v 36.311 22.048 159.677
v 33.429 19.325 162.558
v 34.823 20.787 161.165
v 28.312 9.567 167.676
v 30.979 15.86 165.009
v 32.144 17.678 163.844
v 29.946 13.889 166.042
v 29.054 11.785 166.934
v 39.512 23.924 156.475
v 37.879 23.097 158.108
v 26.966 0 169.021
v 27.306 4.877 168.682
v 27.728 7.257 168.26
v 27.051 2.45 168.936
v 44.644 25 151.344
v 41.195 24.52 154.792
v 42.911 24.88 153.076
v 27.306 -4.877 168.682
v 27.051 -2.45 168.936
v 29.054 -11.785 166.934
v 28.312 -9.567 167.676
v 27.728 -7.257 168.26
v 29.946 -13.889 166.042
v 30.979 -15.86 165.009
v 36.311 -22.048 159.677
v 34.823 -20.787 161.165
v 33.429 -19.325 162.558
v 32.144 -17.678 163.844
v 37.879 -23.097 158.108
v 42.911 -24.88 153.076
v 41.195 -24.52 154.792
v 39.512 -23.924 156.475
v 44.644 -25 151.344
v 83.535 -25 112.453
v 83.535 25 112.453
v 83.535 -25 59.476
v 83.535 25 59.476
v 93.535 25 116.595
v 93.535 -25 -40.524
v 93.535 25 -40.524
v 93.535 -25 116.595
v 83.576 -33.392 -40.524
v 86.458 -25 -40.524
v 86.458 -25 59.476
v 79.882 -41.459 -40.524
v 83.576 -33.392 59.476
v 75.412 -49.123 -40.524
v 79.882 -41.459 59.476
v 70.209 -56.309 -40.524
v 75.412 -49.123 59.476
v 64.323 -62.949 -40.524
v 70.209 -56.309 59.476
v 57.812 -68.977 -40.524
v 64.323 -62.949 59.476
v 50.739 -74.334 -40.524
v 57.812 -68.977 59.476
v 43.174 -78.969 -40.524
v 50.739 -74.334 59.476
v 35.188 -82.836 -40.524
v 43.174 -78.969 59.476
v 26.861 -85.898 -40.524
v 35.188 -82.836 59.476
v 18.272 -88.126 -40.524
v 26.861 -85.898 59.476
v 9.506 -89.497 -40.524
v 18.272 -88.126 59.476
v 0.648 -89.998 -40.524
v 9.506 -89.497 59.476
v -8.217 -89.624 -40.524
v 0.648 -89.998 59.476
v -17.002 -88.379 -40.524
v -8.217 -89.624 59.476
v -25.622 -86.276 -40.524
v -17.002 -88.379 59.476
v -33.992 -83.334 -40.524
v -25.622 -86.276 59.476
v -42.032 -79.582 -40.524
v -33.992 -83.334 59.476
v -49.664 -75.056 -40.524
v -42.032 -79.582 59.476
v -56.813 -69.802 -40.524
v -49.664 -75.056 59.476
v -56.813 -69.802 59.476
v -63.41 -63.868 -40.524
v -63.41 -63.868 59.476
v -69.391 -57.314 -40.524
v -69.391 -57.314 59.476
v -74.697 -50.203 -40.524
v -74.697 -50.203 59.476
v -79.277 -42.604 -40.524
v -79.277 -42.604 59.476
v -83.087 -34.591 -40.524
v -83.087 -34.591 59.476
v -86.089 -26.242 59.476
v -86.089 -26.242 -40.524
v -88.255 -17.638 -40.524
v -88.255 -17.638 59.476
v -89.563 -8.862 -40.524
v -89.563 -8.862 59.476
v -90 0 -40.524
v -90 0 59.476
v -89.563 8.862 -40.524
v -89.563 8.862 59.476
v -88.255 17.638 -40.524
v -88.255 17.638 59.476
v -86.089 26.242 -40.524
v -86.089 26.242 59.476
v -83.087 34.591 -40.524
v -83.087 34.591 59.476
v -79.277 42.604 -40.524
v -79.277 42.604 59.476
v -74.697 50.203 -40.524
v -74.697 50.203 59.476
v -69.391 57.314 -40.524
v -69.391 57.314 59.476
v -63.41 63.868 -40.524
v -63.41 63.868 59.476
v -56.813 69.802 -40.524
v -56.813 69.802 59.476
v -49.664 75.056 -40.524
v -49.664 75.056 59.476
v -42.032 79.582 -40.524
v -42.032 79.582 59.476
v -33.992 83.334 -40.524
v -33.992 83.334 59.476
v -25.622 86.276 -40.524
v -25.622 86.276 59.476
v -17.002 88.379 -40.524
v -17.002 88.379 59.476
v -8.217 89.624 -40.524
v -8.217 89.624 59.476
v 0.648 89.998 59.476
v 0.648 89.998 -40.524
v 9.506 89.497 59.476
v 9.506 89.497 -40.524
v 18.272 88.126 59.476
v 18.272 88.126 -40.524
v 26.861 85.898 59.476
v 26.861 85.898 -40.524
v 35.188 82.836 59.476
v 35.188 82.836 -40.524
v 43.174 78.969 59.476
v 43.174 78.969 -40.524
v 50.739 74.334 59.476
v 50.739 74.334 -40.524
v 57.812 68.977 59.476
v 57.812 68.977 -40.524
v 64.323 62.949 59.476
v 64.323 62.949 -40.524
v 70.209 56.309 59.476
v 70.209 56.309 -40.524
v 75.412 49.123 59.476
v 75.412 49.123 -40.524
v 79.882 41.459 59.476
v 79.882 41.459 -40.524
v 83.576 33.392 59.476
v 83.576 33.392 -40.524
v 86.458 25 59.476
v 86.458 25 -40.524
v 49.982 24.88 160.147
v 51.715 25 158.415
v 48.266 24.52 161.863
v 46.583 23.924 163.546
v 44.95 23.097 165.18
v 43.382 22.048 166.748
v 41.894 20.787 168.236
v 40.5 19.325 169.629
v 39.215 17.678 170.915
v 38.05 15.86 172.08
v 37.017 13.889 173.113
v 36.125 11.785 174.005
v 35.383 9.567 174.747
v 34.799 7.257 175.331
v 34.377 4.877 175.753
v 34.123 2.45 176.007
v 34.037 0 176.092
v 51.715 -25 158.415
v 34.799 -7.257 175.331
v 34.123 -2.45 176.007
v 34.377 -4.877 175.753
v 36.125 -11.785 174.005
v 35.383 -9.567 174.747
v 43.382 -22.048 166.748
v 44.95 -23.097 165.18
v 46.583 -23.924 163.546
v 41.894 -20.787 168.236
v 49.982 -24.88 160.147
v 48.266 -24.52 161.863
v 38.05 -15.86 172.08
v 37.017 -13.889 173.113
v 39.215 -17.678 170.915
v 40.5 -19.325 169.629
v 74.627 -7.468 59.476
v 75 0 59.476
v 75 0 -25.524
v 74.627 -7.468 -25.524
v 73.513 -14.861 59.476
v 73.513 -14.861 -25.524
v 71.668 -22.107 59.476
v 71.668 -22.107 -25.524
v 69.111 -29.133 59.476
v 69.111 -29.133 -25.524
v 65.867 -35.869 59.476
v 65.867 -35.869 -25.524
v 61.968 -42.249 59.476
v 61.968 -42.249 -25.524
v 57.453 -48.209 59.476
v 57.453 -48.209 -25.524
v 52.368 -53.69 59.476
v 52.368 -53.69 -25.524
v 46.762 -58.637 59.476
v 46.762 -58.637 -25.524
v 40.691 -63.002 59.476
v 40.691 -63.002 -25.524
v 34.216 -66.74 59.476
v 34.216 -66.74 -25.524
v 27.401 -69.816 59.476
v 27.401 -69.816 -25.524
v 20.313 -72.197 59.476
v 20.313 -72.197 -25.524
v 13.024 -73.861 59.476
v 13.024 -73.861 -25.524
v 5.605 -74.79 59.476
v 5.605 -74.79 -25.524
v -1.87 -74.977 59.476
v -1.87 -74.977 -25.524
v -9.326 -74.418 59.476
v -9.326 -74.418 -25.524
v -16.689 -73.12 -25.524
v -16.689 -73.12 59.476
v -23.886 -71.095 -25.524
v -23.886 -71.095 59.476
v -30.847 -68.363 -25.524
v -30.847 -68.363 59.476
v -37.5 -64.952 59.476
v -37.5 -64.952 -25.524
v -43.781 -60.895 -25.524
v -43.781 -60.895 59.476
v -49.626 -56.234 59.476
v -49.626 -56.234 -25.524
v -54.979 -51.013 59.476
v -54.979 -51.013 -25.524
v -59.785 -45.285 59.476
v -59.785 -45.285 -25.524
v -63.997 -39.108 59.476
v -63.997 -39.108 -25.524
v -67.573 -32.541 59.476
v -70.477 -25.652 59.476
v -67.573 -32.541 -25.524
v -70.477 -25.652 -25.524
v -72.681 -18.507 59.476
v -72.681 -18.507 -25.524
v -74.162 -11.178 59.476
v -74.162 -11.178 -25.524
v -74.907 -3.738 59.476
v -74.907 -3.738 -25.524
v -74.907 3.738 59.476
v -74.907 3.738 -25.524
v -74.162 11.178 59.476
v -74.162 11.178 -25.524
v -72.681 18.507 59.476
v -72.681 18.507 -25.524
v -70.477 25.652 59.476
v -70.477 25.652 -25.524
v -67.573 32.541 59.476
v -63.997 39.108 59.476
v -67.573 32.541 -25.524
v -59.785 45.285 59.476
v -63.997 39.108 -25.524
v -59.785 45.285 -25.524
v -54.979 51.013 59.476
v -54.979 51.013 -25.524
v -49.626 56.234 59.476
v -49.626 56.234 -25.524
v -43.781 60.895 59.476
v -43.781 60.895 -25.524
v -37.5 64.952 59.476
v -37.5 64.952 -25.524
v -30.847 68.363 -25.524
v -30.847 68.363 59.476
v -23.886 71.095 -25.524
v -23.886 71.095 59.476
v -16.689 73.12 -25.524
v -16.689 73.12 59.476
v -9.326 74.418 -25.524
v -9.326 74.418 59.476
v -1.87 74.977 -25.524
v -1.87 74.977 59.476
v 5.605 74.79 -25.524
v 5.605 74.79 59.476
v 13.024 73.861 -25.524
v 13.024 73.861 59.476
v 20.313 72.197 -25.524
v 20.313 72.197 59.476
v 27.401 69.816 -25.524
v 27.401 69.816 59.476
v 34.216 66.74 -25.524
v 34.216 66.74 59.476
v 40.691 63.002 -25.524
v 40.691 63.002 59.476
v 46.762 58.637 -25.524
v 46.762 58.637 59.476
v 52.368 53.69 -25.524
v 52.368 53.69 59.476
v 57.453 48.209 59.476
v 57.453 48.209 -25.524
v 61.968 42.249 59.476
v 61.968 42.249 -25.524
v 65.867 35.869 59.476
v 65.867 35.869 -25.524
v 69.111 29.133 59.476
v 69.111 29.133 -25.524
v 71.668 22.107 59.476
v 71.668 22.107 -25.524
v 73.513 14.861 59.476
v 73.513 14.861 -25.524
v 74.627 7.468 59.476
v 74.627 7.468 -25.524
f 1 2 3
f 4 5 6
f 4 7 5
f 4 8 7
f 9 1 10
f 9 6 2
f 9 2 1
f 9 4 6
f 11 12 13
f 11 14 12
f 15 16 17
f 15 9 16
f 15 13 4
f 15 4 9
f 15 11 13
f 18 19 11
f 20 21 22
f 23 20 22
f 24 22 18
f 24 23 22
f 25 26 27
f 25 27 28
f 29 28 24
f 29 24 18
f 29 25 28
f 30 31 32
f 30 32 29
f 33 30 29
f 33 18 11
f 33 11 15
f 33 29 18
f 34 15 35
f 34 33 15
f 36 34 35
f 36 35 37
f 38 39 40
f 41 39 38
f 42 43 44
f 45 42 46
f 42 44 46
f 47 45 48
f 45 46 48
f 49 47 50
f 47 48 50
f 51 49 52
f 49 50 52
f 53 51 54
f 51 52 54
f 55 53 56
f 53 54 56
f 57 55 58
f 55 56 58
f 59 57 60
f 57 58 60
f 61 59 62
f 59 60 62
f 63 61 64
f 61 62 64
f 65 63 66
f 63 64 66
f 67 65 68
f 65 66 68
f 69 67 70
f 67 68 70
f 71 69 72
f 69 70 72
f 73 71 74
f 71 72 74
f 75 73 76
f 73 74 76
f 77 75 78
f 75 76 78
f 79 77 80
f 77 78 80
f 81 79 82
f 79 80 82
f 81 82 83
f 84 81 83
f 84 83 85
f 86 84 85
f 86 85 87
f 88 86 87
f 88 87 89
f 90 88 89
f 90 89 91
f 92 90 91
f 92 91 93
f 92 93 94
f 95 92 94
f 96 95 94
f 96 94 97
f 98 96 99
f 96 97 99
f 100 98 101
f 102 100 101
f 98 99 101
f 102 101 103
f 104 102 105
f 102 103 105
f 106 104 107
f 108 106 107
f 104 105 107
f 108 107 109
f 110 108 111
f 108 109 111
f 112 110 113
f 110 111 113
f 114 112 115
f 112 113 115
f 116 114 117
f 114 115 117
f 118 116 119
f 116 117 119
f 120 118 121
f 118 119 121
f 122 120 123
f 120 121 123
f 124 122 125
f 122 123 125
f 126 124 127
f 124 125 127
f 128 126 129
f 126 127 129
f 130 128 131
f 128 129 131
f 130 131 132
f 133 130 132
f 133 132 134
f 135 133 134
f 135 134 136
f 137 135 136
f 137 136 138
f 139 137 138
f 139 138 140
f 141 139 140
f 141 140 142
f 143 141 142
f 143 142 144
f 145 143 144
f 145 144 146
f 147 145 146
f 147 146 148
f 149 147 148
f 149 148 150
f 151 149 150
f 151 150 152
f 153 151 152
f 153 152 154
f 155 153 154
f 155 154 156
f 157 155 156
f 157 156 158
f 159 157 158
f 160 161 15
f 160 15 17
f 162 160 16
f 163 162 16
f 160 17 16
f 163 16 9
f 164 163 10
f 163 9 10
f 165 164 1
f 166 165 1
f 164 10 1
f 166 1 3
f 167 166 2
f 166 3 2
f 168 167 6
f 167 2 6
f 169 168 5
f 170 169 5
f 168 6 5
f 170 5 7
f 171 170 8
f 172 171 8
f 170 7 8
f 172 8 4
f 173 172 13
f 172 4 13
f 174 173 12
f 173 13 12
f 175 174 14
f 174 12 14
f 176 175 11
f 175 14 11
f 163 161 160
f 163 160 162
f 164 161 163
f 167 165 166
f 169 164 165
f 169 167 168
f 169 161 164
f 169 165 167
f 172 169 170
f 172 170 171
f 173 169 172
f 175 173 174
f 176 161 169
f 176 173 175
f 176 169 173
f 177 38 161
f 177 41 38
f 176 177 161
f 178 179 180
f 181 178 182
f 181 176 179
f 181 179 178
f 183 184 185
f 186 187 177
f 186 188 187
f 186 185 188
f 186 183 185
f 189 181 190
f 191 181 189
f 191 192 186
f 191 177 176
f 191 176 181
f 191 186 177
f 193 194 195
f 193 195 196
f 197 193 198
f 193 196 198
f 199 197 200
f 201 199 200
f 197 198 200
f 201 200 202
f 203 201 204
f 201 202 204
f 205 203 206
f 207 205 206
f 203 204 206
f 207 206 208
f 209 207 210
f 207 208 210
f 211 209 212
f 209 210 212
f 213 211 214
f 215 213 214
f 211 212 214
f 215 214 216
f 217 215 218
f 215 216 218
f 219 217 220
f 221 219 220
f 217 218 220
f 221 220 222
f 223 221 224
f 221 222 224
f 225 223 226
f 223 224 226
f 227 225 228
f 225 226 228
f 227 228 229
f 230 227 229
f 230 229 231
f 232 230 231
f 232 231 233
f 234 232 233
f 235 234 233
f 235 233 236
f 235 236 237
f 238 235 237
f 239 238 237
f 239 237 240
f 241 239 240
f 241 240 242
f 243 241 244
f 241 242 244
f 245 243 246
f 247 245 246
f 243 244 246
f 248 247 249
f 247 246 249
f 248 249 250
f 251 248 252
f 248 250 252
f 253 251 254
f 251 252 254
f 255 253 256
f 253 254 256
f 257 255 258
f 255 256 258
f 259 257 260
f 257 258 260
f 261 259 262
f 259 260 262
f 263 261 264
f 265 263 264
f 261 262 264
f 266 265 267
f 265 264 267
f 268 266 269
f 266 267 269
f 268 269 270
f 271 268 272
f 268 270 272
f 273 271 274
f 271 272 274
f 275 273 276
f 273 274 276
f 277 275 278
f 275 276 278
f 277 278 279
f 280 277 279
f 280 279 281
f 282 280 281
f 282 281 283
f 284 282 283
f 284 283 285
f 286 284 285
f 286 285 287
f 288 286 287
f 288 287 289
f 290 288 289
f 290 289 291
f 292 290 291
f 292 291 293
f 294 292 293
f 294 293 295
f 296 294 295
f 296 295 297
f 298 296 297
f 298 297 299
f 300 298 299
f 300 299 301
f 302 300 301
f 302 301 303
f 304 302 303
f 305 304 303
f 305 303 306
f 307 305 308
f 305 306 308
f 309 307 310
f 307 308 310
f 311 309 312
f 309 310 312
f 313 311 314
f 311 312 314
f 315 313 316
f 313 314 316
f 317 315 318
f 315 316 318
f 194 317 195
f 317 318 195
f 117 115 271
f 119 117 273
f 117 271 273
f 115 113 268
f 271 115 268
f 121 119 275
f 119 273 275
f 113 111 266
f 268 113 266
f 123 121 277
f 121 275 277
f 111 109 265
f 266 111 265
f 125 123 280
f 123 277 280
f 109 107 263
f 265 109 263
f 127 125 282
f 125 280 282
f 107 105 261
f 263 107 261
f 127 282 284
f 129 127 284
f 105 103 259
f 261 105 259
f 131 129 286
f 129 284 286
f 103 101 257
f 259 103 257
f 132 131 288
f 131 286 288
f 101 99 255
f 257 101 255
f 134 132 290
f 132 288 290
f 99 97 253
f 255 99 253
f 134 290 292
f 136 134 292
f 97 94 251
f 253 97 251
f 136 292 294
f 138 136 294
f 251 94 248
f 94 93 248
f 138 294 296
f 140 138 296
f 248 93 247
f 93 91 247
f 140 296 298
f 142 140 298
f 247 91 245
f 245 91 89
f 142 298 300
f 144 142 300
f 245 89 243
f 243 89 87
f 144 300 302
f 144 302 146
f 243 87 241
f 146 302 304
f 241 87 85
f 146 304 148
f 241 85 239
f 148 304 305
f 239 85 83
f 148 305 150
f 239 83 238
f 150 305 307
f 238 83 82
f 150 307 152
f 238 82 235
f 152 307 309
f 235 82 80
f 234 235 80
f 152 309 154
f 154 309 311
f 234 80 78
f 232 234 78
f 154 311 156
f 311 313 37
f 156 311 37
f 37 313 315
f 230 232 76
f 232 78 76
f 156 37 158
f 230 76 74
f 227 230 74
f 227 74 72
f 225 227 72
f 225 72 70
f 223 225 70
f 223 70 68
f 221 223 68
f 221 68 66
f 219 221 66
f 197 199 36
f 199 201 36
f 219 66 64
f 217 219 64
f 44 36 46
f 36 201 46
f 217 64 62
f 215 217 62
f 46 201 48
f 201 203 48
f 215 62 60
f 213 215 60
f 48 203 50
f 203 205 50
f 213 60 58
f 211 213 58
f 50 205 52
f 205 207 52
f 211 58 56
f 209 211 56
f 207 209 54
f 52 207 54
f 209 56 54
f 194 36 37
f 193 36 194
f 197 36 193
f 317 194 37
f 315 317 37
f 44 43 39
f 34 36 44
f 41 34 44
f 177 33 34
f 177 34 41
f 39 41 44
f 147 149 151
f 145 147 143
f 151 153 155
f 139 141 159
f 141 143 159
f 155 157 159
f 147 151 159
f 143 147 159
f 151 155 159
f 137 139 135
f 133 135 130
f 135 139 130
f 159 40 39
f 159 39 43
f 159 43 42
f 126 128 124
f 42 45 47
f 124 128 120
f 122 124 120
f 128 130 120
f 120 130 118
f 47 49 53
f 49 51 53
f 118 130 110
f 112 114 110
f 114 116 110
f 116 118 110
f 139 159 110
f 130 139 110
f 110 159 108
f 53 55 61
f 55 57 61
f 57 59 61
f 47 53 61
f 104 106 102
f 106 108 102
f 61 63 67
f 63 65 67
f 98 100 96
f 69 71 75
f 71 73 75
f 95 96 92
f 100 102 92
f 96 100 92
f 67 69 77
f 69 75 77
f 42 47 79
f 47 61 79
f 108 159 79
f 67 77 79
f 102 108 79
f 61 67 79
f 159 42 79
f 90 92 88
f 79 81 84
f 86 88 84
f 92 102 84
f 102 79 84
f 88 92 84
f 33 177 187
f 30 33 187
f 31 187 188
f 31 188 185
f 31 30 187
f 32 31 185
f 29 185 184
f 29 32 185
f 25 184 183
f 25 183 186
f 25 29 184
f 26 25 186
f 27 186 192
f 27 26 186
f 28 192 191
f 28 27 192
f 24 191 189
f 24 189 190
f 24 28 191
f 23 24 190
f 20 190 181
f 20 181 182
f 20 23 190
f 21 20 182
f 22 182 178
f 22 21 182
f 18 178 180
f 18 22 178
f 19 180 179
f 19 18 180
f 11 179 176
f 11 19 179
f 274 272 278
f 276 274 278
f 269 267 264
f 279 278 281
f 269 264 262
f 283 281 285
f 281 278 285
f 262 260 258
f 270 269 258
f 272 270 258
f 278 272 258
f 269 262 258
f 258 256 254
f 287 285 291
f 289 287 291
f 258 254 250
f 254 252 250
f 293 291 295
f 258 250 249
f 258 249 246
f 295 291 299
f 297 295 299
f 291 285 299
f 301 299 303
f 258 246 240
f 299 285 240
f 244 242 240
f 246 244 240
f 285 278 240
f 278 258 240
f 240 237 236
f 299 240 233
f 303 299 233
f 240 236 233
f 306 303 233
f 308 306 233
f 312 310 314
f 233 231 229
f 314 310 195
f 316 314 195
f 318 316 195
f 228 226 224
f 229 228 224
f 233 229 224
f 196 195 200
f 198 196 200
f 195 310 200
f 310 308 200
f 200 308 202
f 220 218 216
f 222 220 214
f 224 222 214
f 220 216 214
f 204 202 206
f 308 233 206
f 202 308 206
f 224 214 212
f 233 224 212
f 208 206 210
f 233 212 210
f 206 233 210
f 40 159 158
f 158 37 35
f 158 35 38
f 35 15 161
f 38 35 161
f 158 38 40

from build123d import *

# Parameters (mm, degrees)
F3_DEPTH = 25
F4_R     = 24.99999


# Not quite as in the source:
# - a fillet or chamfer is up to 0.001 mm smaller than in the source, because OpenCascade refuses the exact size


with BuildPart() as f1:
    # F0 (on Front) → F1 (revolve)
    with BuildSketch(Plane.XZ):
        Polygon((75, -25.5240468681), (0, -25.5240468681), (0, -40.5240468681), (90, -40.5240468681), (90, 59.4759531319), (75, 59.4759531319), align=None)
    revolve(axis=Axis((0, 0, -33.0240468681), (0, 0, -1)))

    # F2 (on Front) → F3 (join, symmetric)
    with BuildSketch(Plane.XZ):
        Polygon((83.5348658891, -40.5240468681), (93.5348658891, -40.5240468681), (93.5348658891, 116.5947673723), (34.0373912061, 176.0922420554), (26.9663233942, 169.0211742435), (83.5348658891, 112.4526317486), align=None)
    extrude(amount=F3_DEPTH, both=True)

    # F4 (radius 25 in the source; OpenCascade refuses exactly that, so slightly less here)
    f4_edges = [f1.edges().sort_by_distance(p)[0] for p in [
        (30.501857, -25, 172.556708),
        (30.501857, 25, 172.556708),
    ]]
    fillet(f4_edges, radius=F4_R)


solid = f1.part
